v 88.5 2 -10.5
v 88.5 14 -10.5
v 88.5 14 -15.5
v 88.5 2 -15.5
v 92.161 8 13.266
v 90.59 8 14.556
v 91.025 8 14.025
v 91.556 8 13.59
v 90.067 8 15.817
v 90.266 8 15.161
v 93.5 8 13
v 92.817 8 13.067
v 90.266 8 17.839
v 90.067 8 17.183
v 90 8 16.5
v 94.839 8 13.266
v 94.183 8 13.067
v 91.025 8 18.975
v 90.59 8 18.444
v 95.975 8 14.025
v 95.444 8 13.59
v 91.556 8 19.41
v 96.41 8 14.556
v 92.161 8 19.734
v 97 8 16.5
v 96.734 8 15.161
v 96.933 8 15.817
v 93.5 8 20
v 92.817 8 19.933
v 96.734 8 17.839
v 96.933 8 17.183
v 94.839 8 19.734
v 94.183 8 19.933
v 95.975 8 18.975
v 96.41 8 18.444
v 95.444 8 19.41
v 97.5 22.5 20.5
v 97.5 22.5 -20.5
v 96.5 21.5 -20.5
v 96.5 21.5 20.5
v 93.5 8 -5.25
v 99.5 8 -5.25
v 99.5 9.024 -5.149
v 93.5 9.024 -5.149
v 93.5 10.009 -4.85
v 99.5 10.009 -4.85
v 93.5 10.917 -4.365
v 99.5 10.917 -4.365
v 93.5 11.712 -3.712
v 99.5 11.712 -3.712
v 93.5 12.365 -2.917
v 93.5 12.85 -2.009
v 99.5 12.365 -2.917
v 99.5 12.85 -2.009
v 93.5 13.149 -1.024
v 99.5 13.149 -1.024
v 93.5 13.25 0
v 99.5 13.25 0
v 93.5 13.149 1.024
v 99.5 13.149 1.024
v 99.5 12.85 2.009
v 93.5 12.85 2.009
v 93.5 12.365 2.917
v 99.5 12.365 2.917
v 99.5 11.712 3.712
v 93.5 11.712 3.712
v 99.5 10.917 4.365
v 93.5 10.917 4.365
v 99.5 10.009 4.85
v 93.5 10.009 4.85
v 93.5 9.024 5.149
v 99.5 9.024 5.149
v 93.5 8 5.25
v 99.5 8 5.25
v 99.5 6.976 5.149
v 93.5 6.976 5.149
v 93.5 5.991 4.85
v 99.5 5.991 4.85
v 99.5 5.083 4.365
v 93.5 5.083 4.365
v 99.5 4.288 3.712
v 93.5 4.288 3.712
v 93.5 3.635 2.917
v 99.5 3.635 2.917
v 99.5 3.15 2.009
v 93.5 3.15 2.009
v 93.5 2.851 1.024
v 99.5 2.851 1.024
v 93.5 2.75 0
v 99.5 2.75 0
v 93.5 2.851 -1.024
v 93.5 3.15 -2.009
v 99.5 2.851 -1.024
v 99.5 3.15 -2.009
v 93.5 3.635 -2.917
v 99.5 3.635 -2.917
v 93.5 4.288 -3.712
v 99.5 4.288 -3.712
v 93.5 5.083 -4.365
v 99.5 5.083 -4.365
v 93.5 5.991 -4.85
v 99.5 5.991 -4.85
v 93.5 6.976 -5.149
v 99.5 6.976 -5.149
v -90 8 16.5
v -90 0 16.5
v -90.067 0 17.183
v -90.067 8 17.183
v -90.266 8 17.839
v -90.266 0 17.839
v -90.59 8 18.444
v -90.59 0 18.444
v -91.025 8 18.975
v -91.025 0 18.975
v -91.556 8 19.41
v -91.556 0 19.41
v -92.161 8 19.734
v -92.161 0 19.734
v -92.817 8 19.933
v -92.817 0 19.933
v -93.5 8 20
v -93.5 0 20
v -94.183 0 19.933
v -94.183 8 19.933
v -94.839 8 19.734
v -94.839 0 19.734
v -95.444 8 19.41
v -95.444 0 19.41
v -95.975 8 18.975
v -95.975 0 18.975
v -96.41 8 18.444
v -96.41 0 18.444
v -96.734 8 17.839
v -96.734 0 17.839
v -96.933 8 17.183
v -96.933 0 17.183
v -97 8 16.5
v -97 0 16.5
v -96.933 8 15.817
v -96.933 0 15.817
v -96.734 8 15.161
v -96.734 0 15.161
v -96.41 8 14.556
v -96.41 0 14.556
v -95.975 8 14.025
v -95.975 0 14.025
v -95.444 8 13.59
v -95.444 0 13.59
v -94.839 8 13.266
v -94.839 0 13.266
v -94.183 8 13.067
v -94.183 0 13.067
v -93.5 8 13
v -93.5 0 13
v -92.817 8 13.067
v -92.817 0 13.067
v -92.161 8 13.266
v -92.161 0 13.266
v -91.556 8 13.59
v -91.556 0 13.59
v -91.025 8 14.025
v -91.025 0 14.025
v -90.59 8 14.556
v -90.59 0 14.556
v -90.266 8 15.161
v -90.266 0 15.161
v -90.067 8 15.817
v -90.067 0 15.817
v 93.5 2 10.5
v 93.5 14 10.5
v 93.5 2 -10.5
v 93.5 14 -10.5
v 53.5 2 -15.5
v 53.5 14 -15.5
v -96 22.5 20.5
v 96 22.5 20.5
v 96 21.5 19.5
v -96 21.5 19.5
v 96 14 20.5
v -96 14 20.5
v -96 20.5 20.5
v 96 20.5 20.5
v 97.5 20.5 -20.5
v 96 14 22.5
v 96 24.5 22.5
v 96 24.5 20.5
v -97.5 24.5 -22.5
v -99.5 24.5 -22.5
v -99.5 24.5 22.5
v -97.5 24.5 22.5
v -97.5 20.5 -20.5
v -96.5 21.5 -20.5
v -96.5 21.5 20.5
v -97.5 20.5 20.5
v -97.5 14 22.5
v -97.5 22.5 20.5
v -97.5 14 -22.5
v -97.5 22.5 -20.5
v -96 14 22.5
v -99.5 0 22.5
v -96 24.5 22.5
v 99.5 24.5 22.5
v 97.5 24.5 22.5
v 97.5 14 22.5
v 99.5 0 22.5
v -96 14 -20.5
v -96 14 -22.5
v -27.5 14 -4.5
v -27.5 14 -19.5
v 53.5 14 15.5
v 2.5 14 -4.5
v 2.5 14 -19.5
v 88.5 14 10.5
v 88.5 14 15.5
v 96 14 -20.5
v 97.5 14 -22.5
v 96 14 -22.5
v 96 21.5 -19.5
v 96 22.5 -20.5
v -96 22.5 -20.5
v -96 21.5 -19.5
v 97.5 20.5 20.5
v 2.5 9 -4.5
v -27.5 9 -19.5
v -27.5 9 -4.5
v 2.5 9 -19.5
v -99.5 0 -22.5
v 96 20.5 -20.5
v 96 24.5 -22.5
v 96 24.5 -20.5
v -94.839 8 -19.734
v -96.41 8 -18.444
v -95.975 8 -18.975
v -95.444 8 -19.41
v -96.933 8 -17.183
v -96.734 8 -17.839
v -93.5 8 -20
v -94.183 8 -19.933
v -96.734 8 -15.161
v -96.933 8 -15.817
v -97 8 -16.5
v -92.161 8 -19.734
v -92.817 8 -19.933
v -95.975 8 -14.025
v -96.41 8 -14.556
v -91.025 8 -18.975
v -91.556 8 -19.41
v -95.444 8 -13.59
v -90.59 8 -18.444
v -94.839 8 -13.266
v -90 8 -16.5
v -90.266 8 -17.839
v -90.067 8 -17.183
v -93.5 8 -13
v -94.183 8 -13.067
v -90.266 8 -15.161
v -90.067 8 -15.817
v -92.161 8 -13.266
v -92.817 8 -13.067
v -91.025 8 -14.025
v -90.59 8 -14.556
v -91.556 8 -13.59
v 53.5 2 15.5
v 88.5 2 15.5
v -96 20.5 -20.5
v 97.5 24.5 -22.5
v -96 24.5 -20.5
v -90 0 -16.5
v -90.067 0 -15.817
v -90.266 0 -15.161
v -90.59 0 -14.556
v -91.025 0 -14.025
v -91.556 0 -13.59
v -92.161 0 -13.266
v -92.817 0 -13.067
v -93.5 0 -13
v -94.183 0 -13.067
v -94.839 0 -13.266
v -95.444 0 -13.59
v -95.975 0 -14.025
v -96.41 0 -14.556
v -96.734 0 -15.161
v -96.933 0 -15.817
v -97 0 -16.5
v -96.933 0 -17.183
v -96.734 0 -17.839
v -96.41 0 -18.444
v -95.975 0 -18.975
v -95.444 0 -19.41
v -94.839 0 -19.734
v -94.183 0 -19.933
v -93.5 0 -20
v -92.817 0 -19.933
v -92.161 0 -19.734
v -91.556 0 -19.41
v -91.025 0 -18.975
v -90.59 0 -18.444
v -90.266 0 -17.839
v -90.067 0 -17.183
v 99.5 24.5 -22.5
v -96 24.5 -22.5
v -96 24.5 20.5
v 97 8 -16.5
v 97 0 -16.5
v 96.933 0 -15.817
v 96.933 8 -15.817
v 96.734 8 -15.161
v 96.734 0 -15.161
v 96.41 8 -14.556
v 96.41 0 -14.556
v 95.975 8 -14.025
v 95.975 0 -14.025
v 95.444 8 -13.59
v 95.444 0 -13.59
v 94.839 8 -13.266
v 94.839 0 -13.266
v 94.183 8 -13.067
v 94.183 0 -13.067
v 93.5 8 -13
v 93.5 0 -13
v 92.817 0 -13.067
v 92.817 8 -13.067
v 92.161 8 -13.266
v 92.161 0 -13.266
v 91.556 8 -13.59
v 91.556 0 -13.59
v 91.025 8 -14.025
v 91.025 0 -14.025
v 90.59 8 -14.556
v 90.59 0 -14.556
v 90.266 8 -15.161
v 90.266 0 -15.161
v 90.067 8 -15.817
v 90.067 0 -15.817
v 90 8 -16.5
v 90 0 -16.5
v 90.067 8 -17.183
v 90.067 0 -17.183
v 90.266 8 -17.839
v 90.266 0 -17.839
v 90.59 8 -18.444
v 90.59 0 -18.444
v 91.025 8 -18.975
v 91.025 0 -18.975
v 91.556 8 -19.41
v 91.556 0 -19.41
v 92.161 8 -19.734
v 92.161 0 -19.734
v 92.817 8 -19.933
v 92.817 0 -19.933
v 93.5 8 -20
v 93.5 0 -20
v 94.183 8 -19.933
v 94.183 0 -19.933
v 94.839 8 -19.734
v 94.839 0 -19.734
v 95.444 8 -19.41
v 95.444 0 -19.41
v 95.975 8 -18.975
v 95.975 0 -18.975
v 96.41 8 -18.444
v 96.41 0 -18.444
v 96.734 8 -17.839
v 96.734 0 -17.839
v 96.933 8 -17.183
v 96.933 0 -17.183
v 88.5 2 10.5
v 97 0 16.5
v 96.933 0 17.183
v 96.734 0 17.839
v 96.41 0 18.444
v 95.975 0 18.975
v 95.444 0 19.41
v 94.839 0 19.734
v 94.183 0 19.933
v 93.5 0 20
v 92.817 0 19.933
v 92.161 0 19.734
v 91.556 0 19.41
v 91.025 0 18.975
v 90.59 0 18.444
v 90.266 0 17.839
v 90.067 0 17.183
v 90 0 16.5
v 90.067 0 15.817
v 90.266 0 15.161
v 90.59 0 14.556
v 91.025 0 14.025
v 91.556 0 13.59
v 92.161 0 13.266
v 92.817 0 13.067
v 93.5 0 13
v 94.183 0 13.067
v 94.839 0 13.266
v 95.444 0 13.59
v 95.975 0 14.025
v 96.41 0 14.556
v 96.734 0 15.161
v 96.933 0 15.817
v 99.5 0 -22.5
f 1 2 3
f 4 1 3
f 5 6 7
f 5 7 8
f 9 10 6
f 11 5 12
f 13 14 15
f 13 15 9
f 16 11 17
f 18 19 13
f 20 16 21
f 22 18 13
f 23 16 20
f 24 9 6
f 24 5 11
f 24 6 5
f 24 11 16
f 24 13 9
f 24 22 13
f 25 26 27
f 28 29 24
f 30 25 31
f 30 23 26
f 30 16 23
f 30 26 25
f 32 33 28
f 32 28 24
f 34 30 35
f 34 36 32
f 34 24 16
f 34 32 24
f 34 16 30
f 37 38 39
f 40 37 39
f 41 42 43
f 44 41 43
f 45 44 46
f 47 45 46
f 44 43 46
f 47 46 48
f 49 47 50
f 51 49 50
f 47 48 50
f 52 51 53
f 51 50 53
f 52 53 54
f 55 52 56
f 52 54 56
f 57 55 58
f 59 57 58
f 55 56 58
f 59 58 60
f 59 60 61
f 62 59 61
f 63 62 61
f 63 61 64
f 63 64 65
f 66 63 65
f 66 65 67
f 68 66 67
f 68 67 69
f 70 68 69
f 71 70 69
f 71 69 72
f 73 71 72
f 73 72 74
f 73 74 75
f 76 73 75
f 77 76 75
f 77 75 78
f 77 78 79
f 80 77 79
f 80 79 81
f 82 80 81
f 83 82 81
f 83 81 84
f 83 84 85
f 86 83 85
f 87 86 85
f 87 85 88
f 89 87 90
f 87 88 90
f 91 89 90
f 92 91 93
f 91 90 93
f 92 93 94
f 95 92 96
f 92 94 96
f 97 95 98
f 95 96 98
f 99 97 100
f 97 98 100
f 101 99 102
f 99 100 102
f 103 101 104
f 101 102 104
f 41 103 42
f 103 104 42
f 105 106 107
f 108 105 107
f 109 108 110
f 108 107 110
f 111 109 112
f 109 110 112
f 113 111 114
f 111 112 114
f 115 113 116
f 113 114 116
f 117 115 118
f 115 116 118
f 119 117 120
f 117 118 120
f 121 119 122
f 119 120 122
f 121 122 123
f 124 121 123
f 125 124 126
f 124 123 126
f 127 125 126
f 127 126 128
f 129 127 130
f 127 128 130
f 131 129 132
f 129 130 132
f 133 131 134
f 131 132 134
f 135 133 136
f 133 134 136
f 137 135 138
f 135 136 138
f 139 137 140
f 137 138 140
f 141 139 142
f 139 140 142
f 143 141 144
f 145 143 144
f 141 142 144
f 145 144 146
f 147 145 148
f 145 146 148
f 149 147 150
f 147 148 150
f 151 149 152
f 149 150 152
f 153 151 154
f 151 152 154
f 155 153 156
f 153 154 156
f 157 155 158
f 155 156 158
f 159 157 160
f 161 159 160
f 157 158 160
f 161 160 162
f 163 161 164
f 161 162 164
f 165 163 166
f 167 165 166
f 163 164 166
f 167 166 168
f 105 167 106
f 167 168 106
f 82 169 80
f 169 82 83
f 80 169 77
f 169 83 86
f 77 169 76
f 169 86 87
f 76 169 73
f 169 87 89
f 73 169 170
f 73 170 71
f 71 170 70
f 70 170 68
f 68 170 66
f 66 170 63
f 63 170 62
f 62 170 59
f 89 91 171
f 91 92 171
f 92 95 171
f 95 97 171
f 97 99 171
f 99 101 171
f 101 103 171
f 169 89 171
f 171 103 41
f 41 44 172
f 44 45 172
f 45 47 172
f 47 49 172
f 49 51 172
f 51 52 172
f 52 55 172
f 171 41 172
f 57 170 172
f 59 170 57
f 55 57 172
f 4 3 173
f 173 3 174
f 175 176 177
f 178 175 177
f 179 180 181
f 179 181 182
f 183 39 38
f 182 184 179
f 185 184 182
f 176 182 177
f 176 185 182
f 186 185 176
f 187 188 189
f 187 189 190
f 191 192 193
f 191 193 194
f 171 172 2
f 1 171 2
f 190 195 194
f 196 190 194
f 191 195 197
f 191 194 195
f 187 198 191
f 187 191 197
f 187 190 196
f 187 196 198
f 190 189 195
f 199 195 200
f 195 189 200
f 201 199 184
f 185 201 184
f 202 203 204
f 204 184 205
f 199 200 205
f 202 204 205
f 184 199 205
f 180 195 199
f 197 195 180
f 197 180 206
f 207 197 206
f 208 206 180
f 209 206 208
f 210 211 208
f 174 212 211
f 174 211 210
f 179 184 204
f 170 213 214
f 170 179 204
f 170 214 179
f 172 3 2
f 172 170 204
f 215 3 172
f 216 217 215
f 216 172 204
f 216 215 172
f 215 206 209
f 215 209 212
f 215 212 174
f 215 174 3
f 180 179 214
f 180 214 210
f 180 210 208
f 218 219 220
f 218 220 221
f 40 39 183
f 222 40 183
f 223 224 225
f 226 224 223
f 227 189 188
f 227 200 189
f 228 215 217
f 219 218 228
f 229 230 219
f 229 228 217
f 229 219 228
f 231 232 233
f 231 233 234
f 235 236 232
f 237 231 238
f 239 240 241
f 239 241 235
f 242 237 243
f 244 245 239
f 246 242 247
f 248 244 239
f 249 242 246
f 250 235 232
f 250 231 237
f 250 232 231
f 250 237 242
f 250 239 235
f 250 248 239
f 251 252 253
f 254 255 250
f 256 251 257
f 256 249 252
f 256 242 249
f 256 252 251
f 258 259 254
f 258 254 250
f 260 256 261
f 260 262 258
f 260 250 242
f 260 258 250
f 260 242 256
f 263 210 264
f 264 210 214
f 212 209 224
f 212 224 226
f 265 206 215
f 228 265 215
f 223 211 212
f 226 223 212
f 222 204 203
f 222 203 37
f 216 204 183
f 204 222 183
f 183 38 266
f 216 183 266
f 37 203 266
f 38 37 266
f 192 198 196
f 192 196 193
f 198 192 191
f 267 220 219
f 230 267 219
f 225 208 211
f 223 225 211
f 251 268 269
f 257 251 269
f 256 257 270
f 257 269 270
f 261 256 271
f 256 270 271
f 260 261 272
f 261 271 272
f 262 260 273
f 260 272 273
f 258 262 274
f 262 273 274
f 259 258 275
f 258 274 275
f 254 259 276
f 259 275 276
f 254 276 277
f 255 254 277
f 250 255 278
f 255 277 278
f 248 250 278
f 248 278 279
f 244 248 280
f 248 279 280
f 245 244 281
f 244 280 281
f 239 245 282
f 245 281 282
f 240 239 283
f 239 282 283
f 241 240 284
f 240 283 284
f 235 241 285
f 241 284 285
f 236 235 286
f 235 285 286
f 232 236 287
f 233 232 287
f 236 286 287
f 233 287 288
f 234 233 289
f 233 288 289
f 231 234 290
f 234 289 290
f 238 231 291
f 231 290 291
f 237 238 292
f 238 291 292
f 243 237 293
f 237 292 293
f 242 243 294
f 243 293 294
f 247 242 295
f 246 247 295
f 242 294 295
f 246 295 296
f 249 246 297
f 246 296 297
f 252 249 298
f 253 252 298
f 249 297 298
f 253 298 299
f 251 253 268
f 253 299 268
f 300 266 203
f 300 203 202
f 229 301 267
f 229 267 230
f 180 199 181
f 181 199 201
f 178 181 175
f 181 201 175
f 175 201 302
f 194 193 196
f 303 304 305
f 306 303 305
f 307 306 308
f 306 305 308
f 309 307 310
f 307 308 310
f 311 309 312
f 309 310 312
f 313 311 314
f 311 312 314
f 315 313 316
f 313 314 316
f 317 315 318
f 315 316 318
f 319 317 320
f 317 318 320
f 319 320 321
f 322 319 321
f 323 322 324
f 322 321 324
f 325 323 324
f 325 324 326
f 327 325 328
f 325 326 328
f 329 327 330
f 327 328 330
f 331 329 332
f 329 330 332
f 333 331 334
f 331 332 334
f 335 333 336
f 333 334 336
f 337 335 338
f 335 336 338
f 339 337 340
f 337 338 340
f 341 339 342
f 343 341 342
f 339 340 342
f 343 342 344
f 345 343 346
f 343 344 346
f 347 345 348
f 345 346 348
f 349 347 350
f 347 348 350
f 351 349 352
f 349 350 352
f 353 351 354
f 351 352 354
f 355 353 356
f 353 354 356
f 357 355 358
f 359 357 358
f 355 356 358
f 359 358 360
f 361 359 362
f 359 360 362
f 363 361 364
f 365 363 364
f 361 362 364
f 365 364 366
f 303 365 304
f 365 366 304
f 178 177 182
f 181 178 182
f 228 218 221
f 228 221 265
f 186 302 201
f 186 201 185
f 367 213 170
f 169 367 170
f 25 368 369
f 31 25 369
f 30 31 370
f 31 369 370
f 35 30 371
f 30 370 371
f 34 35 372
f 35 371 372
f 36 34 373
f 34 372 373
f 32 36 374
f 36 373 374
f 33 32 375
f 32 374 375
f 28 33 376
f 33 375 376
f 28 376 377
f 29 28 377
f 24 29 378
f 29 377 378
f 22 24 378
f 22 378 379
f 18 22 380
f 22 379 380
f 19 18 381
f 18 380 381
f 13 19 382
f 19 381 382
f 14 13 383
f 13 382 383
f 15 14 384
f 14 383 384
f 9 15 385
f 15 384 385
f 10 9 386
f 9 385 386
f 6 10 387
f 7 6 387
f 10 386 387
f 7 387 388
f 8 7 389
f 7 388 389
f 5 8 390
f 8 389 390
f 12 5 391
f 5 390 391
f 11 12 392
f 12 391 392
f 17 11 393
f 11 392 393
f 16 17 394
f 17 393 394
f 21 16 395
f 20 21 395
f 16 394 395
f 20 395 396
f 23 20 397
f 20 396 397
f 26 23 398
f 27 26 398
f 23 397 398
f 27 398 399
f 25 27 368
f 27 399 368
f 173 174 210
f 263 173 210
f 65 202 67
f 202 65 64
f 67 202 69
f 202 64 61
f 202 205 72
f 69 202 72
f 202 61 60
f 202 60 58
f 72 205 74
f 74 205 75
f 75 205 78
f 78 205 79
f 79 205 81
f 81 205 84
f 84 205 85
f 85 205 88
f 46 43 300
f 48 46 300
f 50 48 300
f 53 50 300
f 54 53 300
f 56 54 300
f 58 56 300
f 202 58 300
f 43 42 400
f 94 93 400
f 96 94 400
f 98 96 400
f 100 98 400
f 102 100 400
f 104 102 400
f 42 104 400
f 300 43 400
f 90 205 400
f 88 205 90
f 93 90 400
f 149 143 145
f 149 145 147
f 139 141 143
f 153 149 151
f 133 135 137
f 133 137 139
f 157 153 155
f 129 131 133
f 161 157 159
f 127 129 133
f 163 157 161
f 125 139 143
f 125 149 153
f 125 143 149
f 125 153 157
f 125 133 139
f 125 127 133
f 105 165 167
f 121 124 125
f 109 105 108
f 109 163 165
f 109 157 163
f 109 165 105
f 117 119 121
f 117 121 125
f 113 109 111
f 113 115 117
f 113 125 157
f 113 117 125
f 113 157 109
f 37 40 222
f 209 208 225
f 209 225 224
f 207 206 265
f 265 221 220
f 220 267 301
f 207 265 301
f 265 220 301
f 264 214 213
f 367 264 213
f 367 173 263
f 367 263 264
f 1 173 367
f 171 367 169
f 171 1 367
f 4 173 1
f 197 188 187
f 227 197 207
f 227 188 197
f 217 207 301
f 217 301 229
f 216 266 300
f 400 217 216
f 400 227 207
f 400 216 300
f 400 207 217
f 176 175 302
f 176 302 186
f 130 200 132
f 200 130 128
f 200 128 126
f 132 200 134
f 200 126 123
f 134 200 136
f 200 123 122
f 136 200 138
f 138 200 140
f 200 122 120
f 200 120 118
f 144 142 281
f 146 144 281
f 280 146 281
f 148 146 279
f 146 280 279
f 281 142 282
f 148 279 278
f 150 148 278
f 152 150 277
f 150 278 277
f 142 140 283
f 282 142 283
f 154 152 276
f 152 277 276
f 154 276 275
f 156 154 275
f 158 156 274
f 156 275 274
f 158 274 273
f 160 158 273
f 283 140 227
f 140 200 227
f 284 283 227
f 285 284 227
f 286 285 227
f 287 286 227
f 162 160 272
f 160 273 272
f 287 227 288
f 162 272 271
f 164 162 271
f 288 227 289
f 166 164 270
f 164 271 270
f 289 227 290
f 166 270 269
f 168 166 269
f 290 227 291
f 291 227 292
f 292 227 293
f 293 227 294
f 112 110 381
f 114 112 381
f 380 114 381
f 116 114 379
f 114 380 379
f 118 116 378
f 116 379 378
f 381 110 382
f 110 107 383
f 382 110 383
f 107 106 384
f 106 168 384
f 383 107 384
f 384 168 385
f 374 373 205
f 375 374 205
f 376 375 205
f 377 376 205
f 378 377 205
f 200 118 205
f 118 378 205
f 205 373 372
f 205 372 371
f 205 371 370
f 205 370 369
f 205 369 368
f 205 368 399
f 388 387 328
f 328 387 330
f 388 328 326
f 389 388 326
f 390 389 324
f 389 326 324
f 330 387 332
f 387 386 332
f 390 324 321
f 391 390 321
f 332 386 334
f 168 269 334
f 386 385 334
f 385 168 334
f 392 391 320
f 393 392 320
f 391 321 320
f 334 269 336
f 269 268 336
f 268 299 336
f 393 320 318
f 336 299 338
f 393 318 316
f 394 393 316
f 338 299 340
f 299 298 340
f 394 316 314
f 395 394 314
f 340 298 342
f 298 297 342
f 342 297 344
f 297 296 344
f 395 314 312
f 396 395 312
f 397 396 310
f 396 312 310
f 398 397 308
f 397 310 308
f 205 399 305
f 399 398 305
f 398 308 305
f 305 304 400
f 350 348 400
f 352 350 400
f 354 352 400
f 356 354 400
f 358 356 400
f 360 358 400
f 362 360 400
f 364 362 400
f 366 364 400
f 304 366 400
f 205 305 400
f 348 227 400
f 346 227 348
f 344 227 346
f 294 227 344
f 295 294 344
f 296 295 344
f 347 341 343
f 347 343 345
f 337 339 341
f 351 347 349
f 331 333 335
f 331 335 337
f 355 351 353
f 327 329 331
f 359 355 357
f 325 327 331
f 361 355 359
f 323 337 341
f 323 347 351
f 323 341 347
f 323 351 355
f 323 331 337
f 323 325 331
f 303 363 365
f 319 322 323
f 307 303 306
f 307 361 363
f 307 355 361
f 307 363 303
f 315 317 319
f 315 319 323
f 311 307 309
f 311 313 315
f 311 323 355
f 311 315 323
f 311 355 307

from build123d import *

# Parameters (mm, degrees)
SKETCH1_W           = 199
SKETCH1_H           = 45
BOSS_EXTRUDE1_DEPTH = 14
CUT_EXTRUDE1_DEPTH  = 12
CUT_EXTRUDE2_REACH  = 201
SKETCH3_R           = 5.25
SKETCH4_W           = 30
SKETCH4_H           = 15
CUT_EXTRUDE3_DEPTH  = 5
SKETCH5_W           = 199
SKETCH5_H           = 45
SKETCH5_W_2         = 195
SKETCH5_H_2         = 41
BOSS_EXTRUDE2_DEPTH = 10.5
SKETCH6_W           = 1.5
SKETCH6_H           = 2
CUT_EXTRUDE4_DEPTH  = 10.5
BOSS_EXTRUDE5_DEPTH = 41
BOSS_EXTRUDE6_DEPTH = 192
SKETCH9_R           = 3.5
CUT_EXTRUDE5_DEPTH  = 8


with BuildPart() as part:
    # Sketch1 → Boss-Extrude1 (new body)
    with BuildSketch(Plane(origin=(0, 0, 0), x_dir=(1, 0, 0), z_dir=(0, 1, 0))):
        Rectangle(SKETCH1_W, SKETCH1_H)
    extrude(amount=BOSS_EXTRUDE1_DEPTH)

    # Sketch2 → Cut-Extrude1 (cut)
    with BuildSketch(Plane(origin=(0, 14, 0), x_dir=(1, 0, 0), z_dir=(0, 1, 0))):
        Polygon((88.5, 10.5), (88.5, 15.5), (53.5, 15.5), (53.5, -15.5), (88.5, -15.5), (88.5, -10.5), (93.5, -10.5), (93.5, 10.5), align=None)
    extrude(amount=-CUT_EXTRUDE1_DEPTH, mode=Mode.SUBTRACT)

    # Sketch3 → Cut-Extrude2 (cut, up to next)
    with BuildSketch(Plane(origin=(99.5, 0, 0), x_dir=(0, 0, -1), z_dir=(1, 0, 0)), mode=Mode.PRIVATE) as cut_extrude2_sk1:
        with Locations((0, 8)):
            Circle(SKETCH3_R)
    cut_extrude2_tool1 = extrude(cut_extrude2_sk1.sketch, amount=-CUT_EXTRUDE2_REACH, mode=Mode.PRIVATE) & part.part
    add(cut_extrude2_tool1.solids().sort_by_distance((99.5, 8, 0))[0], mode=Mode.SUBTRACT)

    # Sketch4 → Cut-Extrude3 (cut)
    with BuildSketch(Plane(origin=(0, 14, 0), x_dir=(1, 0, 0), z_dir=(0, 1, 0))):
        with Locations((-12.5, 12)):
            Rectangle(SKETCH4_W, SKETCH4_H)
    extrude(amount=-CUT_EXTRUDE3_DEPTH, mode=Mode.SUBTRACT)

    # Sketch5 → Boss-Extrude2 (add)
    with BuildSketch(Plane(origin=(0, 14, 0), x_dir=(1, 0, 0), z_dir=(0, 1, 0))):
        Rectangle(SKETCH5_W, SKETCH5_H)
        Rectangle(SKETCH5_W_2, SKETCH5_H_2, mode=Mode.SUBTRACT)
    extrude(amount=BOSS_EXTRUDE2_DEPTH)

    # Sketch6 → Cut-Extrude4 (cut)
    with BuildSketch(Plane(origin=(0, 24.5, 0), x_dir=(1, 0, 0), z_dir=(0, 1, 0))):
        with Locations((-96.75, 21.5)):
            Rectangle(SKETCH6_W, SKETCH6_H)
        with Locations((96.75, 21.5)):
            Rectangle(SKETCH6_W, SKETCH6_H)
        with Locations((96.75, -21.5)):
            Rectangle(SKETCH6_W, SKETCH6_H)
        with Locations((-96.75, -21.5)):
            Rectangle(SKETCH6_W, SKETCH6_H)
    extrude(amount=-CUT_EXTRUDE4_DEPTH, mode=Mode.SUBTRACT)

    # Sketch7 → Boss-Extrude5 (add)
    with BuildSketch(Plane.XY.offset(-20.5)):
        Polygon((-97.5, 22.500142463), (-96.5, 21.500142463), (-97.5, 20.500142463), align=None)
        Polygon((97.5, 20.500142463), (97.5, 22.500142463), (96.5, 21.500142463), align=None)
    extrude(amount=BOSS_EXTRUDE5_DEPTH)

    # Sketch8 → Boss-Extrude6 (add)
    with BuildSketch(Plane(origin=(96, 0, 0), x_dir=(0, 0, -1), z_dir=(1, 0, 0))):
        Polygon((-20.5, 22.5), (-19.5, 21.5), (-20.5, 20.5), align=None)
        Polygon((20.5, 20.5), (20.5, 22.5), (19.5, 21.5), align=None)
    extrude(amount=-BOSS_EXTRUDE6_DEPTH)

    # Sketch9 → Cut-Extrude5 (cut)
    with BuildSketch(Plane.XZ):
        with Locations((-93.5, 16.5)):
            Circle(SKETCH9_R)
        with Locations((-93.5, -16.5)):
            Circle(SKETCH9_R)
        with Locations((93.5, -16.5)):
            Circle(SKETCH9_R)
        with Locations((93.5, 16.5)):
            Circle(SKETCH9_R)
    extrude(amount=-CUT_EXTRUDE5_DEPTH, mode=Mode.SUBTRACT)


solid = part.part
